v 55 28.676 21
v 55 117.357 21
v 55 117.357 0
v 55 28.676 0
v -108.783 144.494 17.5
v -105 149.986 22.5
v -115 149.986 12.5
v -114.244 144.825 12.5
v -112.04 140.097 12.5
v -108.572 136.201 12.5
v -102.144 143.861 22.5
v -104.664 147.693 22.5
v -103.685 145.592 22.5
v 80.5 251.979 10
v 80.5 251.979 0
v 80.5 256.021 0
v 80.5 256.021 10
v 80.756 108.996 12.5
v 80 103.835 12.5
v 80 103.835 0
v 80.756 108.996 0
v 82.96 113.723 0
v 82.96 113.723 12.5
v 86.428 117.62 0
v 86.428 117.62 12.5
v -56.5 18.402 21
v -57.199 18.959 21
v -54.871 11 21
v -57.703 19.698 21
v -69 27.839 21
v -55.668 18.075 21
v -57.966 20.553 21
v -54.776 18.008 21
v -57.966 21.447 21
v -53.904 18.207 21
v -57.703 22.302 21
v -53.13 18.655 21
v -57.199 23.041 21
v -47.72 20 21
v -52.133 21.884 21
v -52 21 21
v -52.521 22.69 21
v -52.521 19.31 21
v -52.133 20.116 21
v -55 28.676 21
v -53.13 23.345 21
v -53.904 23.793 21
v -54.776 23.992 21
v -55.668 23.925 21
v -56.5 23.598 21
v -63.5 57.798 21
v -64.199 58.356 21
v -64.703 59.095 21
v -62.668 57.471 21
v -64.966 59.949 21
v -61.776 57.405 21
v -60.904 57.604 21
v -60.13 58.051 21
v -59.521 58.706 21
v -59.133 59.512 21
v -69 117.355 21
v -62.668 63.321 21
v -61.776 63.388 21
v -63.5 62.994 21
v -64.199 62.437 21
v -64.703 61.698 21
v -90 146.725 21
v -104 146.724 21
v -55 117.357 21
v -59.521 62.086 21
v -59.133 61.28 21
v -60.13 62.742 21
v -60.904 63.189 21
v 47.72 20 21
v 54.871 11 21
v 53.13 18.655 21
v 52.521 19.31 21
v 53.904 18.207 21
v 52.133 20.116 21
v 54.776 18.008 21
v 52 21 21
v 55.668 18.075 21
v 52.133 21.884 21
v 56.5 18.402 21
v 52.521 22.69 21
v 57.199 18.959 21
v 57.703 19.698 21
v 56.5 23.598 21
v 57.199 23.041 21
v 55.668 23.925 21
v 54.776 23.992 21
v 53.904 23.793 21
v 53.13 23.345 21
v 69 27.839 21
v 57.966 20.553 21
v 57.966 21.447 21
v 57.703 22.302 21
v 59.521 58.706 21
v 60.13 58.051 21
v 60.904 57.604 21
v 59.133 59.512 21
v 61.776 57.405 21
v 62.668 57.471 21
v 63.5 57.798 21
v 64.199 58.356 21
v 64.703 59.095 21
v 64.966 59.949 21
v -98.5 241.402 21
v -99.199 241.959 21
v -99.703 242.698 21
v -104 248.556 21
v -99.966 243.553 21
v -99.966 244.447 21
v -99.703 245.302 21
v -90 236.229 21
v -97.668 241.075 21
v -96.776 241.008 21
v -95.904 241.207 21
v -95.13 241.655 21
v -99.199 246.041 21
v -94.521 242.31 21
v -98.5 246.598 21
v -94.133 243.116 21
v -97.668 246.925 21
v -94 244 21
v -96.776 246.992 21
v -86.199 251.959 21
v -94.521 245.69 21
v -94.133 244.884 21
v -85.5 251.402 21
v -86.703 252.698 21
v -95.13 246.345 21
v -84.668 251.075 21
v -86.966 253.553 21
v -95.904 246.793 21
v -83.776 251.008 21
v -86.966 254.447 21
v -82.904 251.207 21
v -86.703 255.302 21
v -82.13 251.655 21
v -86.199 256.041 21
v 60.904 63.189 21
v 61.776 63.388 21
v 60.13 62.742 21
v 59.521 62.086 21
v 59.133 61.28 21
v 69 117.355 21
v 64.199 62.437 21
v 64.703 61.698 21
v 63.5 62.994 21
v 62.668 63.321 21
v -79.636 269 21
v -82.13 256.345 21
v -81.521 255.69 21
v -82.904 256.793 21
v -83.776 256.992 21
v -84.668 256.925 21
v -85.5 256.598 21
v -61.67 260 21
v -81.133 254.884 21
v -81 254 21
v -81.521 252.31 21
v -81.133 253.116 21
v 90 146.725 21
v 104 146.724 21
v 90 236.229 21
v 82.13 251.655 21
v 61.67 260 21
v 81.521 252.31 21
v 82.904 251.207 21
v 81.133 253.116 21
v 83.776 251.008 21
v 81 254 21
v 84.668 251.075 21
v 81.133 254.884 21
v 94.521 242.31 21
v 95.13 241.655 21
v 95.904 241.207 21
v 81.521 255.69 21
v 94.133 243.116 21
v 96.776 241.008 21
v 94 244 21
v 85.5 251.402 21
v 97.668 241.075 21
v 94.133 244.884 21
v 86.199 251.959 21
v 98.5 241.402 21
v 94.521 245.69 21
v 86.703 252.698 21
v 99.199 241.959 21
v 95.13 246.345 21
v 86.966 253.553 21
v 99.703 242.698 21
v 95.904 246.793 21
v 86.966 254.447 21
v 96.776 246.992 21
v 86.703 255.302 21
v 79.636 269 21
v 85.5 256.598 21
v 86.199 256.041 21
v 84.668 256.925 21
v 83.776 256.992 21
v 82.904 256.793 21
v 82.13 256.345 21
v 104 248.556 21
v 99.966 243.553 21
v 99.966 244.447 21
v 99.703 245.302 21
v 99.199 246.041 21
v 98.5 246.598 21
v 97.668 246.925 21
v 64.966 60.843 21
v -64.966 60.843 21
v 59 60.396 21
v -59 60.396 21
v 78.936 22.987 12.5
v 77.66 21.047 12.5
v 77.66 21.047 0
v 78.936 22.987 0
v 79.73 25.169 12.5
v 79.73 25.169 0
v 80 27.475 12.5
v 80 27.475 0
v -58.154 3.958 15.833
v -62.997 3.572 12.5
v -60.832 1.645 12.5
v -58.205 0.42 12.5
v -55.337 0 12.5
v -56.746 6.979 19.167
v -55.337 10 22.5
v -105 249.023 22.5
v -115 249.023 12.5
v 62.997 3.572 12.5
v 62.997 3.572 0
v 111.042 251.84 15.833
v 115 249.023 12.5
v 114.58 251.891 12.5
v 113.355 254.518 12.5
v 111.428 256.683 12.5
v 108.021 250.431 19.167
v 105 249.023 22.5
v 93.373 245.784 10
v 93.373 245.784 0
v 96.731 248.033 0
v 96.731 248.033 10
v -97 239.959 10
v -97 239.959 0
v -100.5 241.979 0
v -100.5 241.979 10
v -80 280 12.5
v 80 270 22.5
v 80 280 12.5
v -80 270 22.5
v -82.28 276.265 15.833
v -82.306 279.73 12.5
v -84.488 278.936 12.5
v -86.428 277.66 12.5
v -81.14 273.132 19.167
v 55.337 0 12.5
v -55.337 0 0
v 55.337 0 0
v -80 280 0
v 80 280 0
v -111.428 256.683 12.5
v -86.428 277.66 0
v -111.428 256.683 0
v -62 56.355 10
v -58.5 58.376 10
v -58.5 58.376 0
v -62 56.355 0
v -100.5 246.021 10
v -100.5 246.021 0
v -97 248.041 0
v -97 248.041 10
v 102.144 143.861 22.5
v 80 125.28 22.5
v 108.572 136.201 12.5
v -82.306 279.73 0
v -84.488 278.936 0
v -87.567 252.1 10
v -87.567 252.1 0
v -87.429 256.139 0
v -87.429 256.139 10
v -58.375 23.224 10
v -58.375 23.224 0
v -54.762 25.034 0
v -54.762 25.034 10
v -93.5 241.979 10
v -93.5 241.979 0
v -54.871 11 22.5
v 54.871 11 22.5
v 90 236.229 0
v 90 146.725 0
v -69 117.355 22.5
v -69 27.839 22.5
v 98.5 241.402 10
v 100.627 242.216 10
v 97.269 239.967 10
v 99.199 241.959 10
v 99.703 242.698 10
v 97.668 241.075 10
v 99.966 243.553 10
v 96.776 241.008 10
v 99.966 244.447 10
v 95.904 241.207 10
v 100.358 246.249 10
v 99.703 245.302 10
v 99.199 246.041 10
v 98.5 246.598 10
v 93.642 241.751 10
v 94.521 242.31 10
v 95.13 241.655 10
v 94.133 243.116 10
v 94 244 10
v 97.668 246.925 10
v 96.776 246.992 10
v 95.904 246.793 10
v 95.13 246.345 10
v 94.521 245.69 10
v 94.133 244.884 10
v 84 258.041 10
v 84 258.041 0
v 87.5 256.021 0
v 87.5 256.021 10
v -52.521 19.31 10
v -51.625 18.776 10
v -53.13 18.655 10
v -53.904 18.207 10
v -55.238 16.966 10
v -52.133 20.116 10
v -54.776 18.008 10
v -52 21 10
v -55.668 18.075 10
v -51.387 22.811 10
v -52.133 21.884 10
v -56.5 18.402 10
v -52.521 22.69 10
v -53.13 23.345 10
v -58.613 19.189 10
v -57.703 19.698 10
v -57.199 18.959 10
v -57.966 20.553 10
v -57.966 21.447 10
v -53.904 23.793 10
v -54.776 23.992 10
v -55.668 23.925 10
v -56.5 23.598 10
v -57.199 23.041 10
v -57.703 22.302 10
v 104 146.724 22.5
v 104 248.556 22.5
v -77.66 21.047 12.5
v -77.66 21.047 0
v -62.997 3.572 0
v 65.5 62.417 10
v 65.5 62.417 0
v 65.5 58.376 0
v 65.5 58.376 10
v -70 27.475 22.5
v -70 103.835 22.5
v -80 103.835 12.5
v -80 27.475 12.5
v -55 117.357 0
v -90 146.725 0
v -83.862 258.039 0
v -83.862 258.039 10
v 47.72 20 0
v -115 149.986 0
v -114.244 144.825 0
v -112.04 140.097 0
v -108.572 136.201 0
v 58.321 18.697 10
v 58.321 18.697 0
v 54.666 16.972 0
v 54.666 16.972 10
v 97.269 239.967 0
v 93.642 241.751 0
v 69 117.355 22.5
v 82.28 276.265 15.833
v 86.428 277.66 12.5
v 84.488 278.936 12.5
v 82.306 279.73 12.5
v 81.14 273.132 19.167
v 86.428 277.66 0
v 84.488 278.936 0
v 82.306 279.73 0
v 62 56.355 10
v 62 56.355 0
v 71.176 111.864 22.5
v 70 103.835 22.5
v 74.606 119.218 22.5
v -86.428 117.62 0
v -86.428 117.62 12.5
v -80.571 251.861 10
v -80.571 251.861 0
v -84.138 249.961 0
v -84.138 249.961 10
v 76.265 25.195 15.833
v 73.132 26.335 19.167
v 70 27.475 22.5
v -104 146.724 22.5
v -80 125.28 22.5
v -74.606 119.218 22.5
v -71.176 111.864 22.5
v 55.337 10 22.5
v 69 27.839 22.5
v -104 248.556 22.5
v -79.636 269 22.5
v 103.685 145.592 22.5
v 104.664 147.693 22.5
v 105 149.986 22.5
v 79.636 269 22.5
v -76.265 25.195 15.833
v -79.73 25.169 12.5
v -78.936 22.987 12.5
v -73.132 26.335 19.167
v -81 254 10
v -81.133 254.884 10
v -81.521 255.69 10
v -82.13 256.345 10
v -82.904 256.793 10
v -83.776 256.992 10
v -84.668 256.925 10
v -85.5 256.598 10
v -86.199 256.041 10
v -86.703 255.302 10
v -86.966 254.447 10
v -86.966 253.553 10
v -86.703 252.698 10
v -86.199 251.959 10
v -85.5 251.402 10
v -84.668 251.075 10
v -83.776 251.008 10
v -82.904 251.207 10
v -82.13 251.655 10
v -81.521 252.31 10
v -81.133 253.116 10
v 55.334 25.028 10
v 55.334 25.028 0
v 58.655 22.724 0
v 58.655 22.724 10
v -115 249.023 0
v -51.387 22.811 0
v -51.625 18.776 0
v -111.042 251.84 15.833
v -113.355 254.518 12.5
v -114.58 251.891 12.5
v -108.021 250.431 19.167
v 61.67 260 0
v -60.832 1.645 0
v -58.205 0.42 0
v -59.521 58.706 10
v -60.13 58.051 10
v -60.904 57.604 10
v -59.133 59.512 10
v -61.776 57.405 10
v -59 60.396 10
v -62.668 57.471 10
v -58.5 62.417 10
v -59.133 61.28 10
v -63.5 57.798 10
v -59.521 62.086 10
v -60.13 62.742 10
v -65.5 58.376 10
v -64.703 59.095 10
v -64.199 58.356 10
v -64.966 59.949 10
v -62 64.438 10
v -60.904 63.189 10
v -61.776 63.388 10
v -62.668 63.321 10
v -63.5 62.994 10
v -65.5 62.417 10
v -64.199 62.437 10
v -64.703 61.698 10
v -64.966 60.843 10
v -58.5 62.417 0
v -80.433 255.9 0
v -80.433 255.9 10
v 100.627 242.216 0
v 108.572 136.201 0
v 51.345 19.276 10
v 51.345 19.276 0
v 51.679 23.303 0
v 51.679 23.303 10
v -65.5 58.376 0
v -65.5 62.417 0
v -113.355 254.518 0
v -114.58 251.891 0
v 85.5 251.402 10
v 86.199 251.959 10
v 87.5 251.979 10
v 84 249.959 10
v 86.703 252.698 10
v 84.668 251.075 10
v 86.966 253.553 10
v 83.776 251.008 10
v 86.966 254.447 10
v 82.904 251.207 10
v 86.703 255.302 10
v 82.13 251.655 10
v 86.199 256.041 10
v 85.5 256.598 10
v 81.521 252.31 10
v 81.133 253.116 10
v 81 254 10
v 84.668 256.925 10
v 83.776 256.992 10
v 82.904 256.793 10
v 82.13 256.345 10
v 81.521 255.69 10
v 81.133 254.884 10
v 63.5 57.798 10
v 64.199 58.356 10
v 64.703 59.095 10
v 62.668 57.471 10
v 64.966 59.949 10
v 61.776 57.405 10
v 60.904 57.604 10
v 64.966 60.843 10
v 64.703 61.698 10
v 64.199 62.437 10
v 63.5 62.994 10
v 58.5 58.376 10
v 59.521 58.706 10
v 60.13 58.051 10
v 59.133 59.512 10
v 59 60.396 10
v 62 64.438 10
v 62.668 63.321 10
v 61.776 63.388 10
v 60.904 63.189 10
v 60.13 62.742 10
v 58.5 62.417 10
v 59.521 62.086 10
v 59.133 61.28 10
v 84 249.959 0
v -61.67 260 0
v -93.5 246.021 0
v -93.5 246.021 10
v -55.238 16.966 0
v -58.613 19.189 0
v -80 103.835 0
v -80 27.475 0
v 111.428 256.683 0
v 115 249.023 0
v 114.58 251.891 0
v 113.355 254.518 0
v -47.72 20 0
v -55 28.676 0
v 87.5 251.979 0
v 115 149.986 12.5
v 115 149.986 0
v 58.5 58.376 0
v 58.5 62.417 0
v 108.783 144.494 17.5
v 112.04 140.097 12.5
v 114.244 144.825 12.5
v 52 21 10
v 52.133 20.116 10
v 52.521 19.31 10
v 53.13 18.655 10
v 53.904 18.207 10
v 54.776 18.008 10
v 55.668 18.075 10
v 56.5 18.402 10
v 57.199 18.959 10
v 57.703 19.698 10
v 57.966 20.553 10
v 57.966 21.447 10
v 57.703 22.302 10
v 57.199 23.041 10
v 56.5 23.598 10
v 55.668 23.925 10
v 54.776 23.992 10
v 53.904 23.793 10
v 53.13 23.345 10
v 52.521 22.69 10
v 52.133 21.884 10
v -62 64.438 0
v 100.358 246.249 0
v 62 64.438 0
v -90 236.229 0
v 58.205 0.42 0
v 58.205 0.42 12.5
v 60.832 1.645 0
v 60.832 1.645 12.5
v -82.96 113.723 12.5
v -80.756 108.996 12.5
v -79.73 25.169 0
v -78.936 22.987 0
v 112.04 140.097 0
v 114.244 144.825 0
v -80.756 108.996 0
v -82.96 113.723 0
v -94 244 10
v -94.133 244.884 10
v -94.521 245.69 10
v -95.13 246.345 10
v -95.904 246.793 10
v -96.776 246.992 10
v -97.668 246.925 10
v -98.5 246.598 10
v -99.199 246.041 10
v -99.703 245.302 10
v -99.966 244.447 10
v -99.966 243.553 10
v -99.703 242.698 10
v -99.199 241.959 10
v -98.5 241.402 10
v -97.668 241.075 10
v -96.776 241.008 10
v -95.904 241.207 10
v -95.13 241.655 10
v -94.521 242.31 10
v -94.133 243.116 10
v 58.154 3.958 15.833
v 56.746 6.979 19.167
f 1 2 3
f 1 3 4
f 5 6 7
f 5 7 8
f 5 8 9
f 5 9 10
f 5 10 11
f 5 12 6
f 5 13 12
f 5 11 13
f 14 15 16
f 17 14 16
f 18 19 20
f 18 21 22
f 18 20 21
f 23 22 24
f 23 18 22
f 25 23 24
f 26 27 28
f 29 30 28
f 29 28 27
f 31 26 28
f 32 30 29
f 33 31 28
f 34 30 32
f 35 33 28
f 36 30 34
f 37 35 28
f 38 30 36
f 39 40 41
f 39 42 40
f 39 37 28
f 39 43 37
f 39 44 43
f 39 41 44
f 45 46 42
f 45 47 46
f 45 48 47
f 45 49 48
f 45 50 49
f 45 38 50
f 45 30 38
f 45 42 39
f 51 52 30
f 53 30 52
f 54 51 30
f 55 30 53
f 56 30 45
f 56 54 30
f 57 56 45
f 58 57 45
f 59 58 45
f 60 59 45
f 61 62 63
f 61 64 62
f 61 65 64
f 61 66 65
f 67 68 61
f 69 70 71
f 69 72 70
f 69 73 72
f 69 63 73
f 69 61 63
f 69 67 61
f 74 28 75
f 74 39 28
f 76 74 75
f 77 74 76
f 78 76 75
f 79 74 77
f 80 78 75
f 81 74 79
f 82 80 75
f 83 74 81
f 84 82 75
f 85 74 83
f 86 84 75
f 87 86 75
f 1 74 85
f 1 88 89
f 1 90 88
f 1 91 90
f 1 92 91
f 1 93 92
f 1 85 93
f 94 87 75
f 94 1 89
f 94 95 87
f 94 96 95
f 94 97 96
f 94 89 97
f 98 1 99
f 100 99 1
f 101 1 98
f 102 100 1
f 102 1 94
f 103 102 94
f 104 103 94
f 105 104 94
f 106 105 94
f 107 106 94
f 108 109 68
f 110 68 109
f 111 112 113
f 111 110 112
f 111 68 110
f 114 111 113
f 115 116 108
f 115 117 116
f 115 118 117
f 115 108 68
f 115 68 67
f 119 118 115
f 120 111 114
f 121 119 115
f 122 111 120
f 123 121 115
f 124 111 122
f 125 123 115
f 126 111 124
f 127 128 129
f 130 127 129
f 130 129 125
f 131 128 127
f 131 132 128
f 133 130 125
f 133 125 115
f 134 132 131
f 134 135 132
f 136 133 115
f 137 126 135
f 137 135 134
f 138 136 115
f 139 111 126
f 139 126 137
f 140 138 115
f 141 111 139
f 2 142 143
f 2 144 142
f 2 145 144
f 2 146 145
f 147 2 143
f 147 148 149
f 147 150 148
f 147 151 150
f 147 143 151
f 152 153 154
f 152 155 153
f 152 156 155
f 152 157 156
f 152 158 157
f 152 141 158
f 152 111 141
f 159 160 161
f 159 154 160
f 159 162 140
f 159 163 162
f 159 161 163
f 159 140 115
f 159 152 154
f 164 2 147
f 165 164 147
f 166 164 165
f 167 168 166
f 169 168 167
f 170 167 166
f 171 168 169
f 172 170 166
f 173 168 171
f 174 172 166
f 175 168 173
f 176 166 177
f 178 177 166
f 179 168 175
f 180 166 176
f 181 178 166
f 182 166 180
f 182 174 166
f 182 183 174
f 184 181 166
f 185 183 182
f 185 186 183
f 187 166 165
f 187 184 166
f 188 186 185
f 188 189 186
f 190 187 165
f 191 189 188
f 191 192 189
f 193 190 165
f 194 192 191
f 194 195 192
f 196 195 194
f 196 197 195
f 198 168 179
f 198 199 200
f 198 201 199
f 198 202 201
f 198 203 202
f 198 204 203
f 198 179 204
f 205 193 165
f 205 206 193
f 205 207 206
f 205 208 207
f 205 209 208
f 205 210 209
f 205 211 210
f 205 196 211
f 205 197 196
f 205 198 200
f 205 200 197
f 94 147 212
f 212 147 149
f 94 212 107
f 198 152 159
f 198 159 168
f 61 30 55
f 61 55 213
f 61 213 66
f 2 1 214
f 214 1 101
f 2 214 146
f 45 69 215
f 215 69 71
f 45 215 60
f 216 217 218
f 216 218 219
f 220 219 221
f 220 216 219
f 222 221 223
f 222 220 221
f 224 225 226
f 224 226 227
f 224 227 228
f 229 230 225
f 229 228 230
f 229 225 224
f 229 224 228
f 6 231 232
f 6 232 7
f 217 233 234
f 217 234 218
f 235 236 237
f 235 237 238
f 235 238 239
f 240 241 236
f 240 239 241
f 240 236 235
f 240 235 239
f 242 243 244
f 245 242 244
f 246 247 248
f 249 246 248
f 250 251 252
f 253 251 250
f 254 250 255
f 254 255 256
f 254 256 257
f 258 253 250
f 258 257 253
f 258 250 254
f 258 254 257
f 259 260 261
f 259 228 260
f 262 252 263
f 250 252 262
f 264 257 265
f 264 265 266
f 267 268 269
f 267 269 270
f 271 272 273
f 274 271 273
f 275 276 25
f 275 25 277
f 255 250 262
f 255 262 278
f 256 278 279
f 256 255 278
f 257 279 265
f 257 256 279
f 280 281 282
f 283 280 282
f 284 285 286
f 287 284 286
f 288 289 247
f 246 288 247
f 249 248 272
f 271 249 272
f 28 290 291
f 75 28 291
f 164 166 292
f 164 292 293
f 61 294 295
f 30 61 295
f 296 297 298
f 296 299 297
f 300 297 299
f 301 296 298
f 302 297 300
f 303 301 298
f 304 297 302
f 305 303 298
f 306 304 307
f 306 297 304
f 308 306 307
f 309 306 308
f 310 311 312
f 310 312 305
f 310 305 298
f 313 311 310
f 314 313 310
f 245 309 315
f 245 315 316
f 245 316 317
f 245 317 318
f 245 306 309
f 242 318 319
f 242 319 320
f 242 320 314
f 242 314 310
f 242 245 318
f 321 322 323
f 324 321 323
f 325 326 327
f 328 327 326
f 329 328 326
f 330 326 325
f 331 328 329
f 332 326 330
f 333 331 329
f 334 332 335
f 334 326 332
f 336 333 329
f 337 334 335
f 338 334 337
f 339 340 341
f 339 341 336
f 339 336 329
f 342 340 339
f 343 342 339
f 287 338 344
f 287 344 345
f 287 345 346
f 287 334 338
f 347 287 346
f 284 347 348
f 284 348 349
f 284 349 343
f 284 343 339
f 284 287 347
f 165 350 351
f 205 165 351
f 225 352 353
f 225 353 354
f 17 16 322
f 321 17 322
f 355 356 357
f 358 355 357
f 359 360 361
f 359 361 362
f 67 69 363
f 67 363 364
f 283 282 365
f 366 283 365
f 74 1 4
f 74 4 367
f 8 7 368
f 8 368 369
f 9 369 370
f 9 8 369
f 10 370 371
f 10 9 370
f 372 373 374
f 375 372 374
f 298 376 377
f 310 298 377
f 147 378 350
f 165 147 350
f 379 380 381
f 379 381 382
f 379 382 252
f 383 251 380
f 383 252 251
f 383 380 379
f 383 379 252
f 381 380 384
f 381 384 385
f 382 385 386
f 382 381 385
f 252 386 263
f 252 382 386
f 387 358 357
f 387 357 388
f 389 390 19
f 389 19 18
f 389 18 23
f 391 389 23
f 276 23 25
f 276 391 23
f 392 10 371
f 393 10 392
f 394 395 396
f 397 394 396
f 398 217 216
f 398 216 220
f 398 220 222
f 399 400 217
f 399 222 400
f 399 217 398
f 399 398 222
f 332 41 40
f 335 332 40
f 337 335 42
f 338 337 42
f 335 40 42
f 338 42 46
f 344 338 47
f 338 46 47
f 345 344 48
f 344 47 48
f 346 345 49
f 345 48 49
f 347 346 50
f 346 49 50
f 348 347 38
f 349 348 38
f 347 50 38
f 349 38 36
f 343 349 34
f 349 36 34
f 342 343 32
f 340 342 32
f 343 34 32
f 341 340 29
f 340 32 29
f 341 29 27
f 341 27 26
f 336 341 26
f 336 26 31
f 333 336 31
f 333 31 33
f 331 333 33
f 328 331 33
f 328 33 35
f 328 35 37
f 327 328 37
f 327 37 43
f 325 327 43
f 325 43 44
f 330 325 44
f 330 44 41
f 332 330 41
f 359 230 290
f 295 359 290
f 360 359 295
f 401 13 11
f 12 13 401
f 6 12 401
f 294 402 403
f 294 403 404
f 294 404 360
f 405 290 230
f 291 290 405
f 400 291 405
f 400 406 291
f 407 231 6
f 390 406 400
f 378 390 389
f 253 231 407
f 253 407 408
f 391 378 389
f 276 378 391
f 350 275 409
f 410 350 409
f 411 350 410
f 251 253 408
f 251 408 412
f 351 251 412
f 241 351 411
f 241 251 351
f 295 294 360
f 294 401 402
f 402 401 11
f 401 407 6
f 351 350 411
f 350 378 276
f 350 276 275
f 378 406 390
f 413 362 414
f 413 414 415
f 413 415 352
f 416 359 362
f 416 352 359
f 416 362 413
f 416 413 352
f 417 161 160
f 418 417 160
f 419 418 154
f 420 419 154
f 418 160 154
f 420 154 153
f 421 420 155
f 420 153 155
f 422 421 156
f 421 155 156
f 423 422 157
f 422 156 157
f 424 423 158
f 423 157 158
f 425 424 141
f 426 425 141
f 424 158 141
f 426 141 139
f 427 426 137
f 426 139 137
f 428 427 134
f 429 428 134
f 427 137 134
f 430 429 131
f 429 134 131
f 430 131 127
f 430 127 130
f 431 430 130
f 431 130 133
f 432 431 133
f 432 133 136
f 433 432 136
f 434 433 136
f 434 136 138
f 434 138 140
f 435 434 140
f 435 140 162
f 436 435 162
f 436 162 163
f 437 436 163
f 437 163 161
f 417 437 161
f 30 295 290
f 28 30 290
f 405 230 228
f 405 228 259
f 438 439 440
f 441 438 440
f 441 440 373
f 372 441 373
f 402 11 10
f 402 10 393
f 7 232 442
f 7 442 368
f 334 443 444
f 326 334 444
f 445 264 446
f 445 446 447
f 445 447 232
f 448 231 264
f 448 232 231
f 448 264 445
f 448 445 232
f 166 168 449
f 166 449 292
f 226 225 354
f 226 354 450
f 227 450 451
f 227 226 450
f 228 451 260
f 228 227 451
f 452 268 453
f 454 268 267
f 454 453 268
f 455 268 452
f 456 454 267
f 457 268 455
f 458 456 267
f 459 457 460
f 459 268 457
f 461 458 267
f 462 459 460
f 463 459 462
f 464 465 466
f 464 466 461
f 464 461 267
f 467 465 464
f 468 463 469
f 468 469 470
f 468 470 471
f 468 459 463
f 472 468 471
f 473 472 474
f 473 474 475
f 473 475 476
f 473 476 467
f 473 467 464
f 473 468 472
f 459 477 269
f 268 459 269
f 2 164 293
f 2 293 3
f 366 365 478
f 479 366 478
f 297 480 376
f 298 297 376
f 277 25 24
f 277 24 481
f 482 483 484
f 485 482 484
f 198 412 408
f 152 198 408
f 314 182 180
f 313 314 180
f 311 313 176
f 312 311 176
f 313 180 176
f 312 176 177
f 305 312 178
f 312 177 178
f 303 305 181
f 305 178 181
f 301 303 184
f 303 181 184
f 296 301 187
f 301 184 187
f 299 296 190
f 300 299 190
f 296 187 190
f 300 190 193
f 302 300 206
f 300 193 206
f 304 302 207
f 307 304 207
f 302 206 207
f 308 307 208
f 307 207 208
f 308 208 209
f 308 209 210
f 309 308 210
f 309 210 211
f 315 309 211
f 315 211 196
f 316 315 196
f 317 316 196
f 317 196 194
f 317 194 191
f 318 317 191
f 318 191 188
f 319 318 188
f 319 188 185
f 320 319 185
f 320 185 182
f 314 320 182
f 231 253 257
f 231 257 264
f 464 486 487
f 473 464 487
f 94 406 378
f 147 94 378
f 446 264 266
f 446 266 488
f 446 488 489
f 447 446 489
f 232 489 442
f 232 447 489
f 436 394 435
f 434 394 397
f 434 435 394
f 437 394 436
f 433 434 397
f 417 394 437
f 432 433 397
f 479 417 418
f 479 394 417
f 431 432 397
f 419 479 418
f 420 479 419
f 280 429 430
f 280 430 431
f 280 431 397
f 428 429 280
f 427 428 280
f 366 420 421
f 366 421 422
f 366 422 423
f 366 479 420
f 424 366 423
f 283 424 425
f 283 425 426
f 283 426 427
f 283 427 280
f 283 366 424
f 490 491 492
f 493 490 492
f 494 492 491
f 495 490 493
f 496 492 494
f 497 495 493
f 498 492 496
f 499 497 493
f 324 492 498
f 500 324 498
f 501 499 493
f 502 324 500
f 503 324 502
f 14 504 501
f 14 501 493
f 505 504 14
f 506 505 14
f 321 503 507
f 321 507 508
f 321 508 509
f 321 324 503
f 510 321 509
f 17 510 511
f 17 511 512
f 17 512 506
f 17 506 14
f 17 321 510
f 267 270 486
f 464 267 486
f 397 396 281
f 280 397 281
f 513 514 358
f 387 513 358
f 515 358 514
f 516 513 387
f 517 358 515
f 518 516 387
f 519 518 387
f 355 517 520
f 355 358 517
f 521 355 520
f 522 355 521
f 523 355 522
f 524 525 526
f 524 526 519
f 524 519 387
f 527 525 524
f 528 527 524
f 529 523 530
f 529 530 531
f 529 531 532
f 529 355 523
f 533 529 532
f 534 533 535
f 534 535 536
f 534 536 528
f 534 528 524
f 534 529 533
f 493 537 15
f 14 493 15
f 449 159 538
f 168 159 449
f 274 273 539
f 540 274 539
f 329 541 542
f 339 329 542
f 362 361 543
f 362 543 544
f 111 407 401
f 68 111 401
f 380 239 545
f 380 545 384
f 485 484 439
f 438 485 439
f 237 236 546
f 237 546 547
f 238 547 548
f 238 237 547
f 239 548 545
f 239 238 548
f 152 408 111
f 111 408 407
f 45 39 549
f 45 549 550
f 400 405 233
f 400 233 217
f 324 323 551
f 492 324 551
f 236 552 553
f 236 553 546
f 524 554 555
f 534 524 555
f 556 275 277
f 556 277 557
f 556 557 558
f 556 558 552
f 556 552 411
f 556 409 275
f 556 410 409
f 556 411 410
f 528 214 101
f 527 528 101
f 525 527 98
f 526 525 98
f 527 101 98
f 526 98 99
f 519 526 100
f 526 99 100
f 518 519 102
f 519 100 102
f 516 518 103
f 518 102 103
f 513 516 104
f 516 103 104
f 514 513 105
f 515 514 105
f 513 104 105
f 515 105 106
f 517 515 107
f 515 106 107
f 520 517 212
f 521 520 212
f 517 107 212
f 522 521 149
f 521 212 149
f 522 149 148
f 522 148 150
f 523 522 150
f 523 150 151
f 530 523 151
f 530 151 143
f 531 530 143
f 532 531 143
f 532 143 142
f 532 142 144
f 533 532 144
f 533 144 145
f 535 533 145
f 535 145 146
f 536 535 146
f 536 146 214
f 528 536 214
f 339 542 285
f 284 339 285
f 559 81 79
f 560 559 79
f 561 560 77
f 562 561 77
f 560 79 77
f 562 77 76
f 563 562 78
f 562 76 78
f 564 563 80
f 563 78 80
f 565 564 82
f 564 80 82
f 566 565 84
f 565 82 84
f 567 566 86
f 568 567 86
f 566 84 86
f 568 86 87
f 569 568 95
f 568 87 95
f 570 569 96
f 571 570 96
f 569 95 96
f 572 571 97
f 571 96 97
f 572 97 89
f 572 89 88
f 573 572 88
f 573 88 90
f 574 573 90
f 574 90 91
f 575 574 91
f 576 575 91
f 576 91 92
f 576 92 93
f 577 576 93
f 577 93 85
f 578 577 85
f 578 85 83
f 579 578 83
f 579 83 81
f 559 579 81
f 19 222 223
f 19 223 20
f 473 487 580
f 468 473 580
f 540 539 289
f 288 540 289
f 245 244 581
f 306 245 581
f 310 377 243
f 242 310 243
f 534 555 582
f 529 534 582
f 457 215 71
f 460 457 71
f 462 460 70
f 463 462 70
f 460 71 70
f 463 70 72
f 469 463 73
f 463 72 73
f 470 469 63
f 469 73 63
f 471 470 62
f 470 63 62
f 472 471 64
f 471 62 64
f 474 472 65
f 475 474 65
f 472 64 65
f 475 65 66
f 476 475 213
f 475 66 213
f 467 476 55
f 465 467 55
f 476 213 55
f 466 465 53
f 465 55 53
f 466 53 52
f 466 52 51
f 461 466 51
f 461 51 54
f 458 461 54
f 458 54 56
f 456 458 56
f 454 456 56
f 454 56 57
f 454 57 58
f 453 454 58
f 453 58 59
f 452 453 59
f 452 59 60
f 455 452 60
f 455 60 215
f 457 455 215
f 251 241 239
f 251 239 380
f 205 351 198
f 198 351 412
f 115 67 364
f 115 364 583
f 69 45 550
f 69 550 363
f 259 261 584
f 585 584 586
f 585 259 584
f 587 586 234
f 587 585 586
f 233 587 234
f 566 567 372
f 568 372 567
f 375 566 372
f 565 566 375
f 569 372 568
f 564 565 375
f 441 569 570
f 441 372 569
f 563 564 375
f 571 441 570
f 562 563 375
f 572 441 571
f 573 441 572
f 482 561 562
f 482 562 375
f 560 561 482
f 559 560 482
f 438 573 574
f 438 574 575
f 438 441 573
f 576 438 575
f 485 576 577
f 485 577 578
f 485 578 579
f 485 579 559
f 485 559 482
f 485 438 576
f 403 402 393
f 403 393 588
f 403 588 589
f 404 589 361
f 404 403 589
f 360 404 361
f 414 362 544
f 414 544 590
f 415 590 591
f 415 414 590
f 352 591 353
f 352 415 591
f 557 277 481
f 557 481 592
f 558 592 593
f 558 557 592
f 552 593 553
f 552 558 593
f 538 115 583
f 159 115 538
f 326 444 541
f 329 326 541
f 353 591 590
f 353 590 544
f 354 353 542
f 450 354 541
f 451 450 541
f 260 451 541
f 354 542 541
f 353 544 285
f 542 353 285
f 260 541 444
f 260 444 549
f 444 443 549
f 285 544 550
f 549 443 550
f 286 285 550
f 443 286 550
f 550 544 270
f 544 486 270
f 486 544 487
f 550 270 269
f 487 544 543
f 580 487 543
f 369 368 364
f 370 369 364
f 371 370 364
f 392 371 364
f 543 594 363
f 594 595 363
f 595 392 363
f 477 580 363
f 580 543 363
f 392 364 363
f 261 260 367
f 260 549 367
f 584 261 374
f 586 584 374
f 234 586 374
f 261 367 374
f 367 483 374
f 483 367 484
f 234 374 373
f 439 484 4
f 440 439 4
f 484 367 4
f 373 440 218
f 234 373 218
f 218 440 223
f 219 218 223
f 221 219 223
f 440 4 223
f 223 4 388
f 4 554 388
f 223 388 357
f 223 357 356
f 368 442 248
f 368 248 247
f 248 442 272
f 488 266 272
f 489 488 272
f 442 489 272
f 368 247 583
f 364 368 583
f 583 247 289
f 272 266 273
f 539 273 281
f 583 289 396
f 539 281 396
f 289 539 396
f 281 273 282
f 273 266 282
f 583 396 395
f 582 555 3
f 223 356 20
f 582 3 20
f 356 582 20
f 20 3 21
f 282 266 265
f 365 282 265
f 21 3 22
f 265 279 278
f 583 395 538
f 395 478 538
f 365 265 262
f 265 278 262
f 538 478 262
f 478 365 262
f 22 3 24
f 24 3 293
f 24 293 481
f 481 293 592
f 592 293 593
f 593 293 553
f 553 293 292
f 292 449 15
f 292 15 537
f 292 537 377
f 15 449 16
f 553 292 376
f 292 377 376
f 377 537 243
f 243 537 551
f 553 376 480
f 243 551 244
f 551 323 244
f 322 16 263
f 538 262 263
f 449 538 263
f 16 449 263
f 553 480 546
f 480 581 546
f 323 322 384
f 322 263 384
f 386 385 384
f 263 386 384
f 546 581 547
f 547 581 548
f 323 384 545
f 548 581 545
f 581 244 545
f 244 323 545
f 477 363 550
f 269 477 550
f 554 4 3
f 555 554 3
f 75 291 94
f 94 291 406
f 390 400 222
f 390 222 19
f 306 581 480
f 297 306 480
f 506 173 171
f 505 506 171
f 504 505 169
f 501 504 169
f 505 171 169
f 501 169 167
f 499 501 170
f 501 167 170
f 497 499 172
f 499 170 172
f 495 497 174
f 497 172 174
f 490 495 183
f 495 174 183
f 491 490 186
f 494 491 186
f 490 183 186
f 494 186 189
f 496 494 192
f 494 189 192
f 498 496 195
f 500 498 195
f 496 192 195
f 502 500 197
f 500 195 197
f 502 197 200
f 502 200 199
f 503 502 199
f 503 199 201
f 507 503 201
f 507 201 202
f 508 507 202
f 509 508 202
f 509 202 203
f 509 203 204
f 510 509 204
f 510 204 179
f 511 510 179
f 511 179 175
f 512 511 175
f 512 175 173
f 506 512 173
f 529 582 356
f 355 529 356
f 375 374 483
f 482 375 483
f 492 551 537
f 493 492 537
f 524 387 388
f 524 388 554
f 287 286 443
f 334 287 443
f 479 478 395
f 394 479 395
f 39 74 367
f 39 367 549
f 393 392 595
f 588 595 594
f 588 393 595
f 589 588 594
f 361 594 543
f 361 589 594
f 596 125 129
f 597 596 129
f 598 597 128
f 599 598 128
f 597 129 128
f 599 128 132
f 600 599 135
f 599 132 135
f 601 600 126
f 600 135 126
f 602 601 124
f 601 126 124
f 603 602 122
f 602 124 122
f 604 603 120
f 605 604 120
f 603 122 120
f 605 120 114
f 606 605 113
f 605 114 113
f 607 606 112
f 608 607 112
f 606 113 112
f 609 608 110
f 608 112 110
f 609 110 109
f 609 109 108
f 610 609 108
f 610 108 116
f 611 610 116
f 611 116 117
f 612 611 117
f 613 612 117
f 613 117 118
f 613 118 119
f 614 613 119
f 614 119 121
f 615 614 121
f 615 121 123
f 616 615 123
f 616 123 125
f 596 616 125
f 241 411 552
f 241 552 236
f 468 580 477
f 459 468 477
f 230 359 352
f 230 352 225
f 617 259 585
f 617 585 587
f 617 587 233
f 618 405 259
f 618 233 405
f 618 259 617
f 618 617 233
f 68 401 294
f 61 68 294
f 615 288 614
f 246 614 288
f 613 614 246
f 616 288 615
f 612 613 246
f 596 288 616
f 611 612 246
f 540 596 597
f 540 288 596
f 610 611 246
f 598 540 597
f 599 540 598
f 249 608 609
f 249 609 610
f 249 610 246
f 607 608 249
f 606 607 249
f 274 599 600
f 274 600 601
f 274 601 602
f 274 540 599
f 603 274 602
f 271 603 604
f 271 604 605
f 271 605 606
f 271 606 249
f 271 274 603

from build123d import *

# Parameters (mm, degrees)
RESSALTO_EXTRUS_O1_DEPTH = 22.5
CHANFRO1_SIZE            = 10
CORTE_EXTRUS_O1_REACH    = 305.531
ESBO_O3_W                = 1139.230904301
ESBO_O3_H                = 709.798033895
CORTE_EXTRUS_O5_DEPTH    = 1.5
ESBO_O5_R                = 3
CORTE_EXTRUS_O6_DEPTH    = 304.423796035
CORTE_EXTRUS_O8_DEPTH    = 10


with BuildPart() as part:
    # Esboço1 → Ressalto-extrusão1 (new, symmetric)
    with BuildSketch(Plane.XY):
        with BuildLine():
            Line((-55.336923418, 0), (55.336923418, 0))
            ThreePointArc((55.336923418, 0), (59.563106036, 0.93692213), (62.99736785, 3.572123903))
            Line((62.99736785, 3.572123903), (77.660444431, 21.046898098))
            ThreePointArc((77.660444431, 21.046898098), (79.396926208, 24.054572761), (80, 27.474774195))
            Line((80, 27.474774195), (80, 103.835071852))
            ThreePointArc((80, 103.835071852), (81.685949179, 111.43989715), (86.427876097, 117.619696626))
            Line((86.427876097, 117.619696626), (108.572123903, 136.200926793))
            ThreePointArc((108.572123903, 136.200926793), (113.314050821, 142.380726268), (115, 149.985551567))
            Line((115, 149.985551567), (115, 249.022509221))
            ThreePointArc((115, 249.022509221), (114.06307787, 253.248691838), (111.427876097, 256.682953652))
            Line((111.427876097, 256.682953652), (86.427876097, 277.660444431))
            ThreePointArc((86.427876097, 277.660444431), (83.420201433, 279.396926208), (80, 280))
            Line((80, 280), (-80, 280))
            ThreePointArc((-80, 280), (-83.420201433, 279.396926208), (-86.427876097, 277.660444431))
            Line((-86.427876097, 277.660444431), (-111.427876097, 256.682953652))
            ThreePointArc((-111.427876097, 256.682953652), (-114.06307787, 253.248691838), (-115, 249.022509221))
            Line((-115, 249.022509221), (-115, 149.985551567))
            ThreePointArc((-115, 149.985551567), (-113.314050821, 142.380726268), (-108.572123903, 136.200926793))
            Line((-108.572123903, 136.200926793), (-86.427876097, 117.619696626))
            ThreePointArc((-86.427876097, 117.619696626), (-81.685949179, 111.43989715), (-80, 103.835071852))
            Line((-80, 103.835071852), (-80, 27.474774195))
            ThreePointArc((-80, 27.474774195), (-79.396926208, 24.054572761), (-77.660444431, 21.046898098))
            Line((-77.660444431, 21.046898098), (-62.99736785, 3.572123903))
            ThreePointArc((-62.99736785, 3.572123903), (-59.563106036, 0.93692213), (-55.336923418, 0))
        make_face()
        Polygon((-90, 146.725210262), (-90, 236.228675506), (-61.670438633, 260), (61.670438633, 260), (90, 236.228675506), (90, 146.725210262), (55, 117.356723171), (55, 28.676328085), (47.719696304, 20), (-47.719696304, 20), (-55, 28.676328085), (-55, 117.356723171), align=None, mode=Mode.SUBTRACT)
    extrude(amount=RESSALTO_EXTRUS_O1_DEPTH, both=True)

    # Chanfro1
    chanfro1_edges = [part.edges().sort_by_distance(p)[0] for p in [
        (-70.32890614, 12.309511, 22.5),
        (-59.563106036, 0.93692213, 22.5),
        (0, 0, 22.5),
        (59.563106036, 0.93692213, 22.5),
        (70.32890614, 12.309511, 22.5),
        (79.396926208, 24.054572761, 22.5),
        (80, 65.654923023, 22.5),
        (81.685949179, 111.43989715, 22.5),
        (97.5, 126.910311709, 22.5),
        (113.314050821, 142.380726268, 22.5),
        (115, 199.504030394, 22.5),
        (114.06307787, 253.248691838, 22.5),
        (98.927876097, 267.171699041, 22.5),
        (98.927876097, 267.171699041, -22.5),
        (114.06307787, 253.248691838, -22.5),
        (115, 199.504030394, -22.5),
        (113.314050821, 142.380726268, -22.5),
        (97.5, 126.910311709, -22.5),
        (81.685949179, 111.43989715, -22.5),
        (80, 65.654923023, -22.5),
        (79.396926208, 24.054572761, -22.5),
        (70.32890614, 12.309511, -22.5),
        (59.563106036, 0.93692213, -22.5),
        (0, 0, -22.5),
        (-59.563106036, 0.93692213, -22.5),
        (-70.32890614, 12.309511, -22.5),
        (-79.396926208, 24.054572761, -22.5),
        (-80, 65.654923023, -22.5),
        (-81.685949179, 111.43989715, -22.5),
        (-97.5, 126.910311709, -22.5),
        (-113.314050821, 142.380726268, -22.5),
        (-115, 199.504030394, -22.5),
        (-114.06307787, 253.248691838, -22.5),
        (-98.927876097, 267.171699041, -22.5),
        (-83.420201433, 279.396926208, -22.5),
        (0, 280, -22.5),
        (83.420201433, 279.396926208, -22.5),
        (83.420201433, 279.396926208, 22.5),
        (0, 280, 22.5),
        (-83.420201433, 279.396926208, 22.5),
        (-98.927876097, 267.171699041, 22.5),
        (-114.06307787, 253.248691838, 22.5),
        (-115, 199.504030394, 22.5),
        (-113.314050821, 142.380726268, 22.5),
        (-97.5, 126.910311709, 22.5),
        (-81.685949179, 111.43989715, 22.5),
        (-80, 65.654923023, 22.5),
        (-79.396926208, 24.054572761, 22.5),
    ]]
    chamfer(chanfro1_edges, length=CHANFRO1_SIZE - 0.0001)  # a hair under: the kernel refuses the full size

    # Esboço3 → Corte-extrusão1 (cut, up to next)
    with BuildSketch(Plane.XY, mode=Mode.PRIVATE) as corte_extrus_o1_sk1:
        with Locations((-153.157436203, 152.53565808)):
            Rectangle(ESBO_O3_W, ESBO_O3_H)
    corte_extrus_o1_tool1 = extrude(corte_extrus_o1_sk1.sketch, amount=-CORTE_EXTRUS_O1_REACH, mode=Mode.PRIVATE) & part.part
    add(corte_extrus_o1_tool1.solids().sort_by_distance((-153.157436, 152.535658, 0))[0], mode=Mode.SUBTRACT)

    # Esboço4 → Corte-extrusão5 (cut)
    with BuildSketch(Plane.XY.offset(22.5)):
        Polygon((-69, 27.838744429), (-54.87061576, 11), (54.87061576, 11), (69, 27.838744429), (69, 117.355452403), (104, 146.723939495), (104, 248.556201562), (79.636029766, 269), (-79.636029766, 269), (-104, 248.556201562), (-104, 146.723939495), (-69, 117.355452403), align=None)
        Polygon((-90, 146.725210262), (-90, 236.228675506), (-61.670438633, 260), (61.670438633, 260), (90, 236.228675506), (90, 146.725210262), (55, 117.356723171), (55, 28.676328085), (47.719696304, 20), (-47.719696304, 20), (-55, 28.676328085), (-55, 117.356723171), align=None, mode=Mode.SUBTRACT)
    extrude(amount=-CORTE_EXTRUS_O5_DEPTH, mode=Mode.SUBTRACT)

    # Esboço5 → Corte-extrusão6 (cut, through all)
    with BuildSketch(Plane.XY.offset(21)):
        with Locations((-97, 244)):
            Circle(ESBO_O5_R)
        with Locations((-62, 60.396230411)):
            Circle(ESBO_O5_R)
        with Locations((-84, 254)):
            Circle(ESBO_O5_R)
        with Locations((-55, 21)):
            Circle(ESBO_O5_R)
        with Locations(Location((55, 21, 0), (0, 0, 180))):
            Circle(ESBO_O5_R)
        with Locations(Location((84, 254, 0), (0, 0, 180))):
            Circle(ESBO_O5_R)
        with Locations(Location((62, 60.396230411, 0), (0, 0, 180))):
            Circle(ESBO_O5_R)
        with Locations(Location((97, 244, 0), (0, 0, 180))):
            Circle(ESBO_O5_R)
    extrude(amount=-CORTE_EXTRUS_O6_DEPTH, mode=Mode.SUBTRACT)

    # Esboço7 → Corte-extrusão8 (cut)
    with BuildSketch(Plane(origin=(0, 0, 0), x_dir=(-1, 0, 0), z_dir=(0, 0, -1))):
        Polygon((83.862394336, 258.039108567), (80.43322654, 255.900384282), (80.570832205, 251.861275715), (84.137605664, 249.960891433), (87.56677346, 252.099615718), (87.429167795, 256.138724285), align=None)
        Polygon((-96.731346334, 248.032512683), (-100.357931592, 246.248917241), (-100.626585258, 242.216404558), (-97.268653666, 239.967487317), (-93.642068408, 241.751082759), (-93.373414742, 245.783595442), align=None)
        Polygon((-62, 64.437682295), (-65.5, 62.416956353), (-65.5, 58.375504468), (-62, 56.354778526), (-58.5, 58.375504468), (-58.5, 62.416956353), align=None)
        Polygon((-84, 258.041451884), (-87.5, 256.020725942), (-87.5, 251.979274058), (-84, 249.958548116), (-80.5, 251.979274058), (-80.5, 256.020725942), align=None)
        Polygon((54.761641425, 25.034416751), (51.386913316, 22.810783794), (51.625271892, 18.776367043), (55.238358575, 16.965583249), (58.613086684, 19.189216206), (58.374728108, 23.223632957), align=None)
        Polygon((62, 64.437682295), (58.5, 62.416956353), (58.5, 58.375504468), (62, 56.354778526), (65.5, 58.375504468), (65.5, 62.416956353), align=None)
        Polygon((97, 248.041451884), (93.5, 246.020725942), (93.5, 241.979274058), (97, 239.958548116), (100.5, 241.979274058), (100.5, 246.020725942), align=None)
        Polygon((-55.334155485, 25.027613865), (-58.655093666, 22.724419793), (-58.320938181, 18.696805928), (-54.665844515, 16.972386135), (-51.344906334, 19.275580207), (-51.679061819, 23.303194072), align=None)
    extrude(amount=-CORTE_EXTRUS_O8_DEPTH, mode=Mode.SUBTRACT)


solid = part.part
